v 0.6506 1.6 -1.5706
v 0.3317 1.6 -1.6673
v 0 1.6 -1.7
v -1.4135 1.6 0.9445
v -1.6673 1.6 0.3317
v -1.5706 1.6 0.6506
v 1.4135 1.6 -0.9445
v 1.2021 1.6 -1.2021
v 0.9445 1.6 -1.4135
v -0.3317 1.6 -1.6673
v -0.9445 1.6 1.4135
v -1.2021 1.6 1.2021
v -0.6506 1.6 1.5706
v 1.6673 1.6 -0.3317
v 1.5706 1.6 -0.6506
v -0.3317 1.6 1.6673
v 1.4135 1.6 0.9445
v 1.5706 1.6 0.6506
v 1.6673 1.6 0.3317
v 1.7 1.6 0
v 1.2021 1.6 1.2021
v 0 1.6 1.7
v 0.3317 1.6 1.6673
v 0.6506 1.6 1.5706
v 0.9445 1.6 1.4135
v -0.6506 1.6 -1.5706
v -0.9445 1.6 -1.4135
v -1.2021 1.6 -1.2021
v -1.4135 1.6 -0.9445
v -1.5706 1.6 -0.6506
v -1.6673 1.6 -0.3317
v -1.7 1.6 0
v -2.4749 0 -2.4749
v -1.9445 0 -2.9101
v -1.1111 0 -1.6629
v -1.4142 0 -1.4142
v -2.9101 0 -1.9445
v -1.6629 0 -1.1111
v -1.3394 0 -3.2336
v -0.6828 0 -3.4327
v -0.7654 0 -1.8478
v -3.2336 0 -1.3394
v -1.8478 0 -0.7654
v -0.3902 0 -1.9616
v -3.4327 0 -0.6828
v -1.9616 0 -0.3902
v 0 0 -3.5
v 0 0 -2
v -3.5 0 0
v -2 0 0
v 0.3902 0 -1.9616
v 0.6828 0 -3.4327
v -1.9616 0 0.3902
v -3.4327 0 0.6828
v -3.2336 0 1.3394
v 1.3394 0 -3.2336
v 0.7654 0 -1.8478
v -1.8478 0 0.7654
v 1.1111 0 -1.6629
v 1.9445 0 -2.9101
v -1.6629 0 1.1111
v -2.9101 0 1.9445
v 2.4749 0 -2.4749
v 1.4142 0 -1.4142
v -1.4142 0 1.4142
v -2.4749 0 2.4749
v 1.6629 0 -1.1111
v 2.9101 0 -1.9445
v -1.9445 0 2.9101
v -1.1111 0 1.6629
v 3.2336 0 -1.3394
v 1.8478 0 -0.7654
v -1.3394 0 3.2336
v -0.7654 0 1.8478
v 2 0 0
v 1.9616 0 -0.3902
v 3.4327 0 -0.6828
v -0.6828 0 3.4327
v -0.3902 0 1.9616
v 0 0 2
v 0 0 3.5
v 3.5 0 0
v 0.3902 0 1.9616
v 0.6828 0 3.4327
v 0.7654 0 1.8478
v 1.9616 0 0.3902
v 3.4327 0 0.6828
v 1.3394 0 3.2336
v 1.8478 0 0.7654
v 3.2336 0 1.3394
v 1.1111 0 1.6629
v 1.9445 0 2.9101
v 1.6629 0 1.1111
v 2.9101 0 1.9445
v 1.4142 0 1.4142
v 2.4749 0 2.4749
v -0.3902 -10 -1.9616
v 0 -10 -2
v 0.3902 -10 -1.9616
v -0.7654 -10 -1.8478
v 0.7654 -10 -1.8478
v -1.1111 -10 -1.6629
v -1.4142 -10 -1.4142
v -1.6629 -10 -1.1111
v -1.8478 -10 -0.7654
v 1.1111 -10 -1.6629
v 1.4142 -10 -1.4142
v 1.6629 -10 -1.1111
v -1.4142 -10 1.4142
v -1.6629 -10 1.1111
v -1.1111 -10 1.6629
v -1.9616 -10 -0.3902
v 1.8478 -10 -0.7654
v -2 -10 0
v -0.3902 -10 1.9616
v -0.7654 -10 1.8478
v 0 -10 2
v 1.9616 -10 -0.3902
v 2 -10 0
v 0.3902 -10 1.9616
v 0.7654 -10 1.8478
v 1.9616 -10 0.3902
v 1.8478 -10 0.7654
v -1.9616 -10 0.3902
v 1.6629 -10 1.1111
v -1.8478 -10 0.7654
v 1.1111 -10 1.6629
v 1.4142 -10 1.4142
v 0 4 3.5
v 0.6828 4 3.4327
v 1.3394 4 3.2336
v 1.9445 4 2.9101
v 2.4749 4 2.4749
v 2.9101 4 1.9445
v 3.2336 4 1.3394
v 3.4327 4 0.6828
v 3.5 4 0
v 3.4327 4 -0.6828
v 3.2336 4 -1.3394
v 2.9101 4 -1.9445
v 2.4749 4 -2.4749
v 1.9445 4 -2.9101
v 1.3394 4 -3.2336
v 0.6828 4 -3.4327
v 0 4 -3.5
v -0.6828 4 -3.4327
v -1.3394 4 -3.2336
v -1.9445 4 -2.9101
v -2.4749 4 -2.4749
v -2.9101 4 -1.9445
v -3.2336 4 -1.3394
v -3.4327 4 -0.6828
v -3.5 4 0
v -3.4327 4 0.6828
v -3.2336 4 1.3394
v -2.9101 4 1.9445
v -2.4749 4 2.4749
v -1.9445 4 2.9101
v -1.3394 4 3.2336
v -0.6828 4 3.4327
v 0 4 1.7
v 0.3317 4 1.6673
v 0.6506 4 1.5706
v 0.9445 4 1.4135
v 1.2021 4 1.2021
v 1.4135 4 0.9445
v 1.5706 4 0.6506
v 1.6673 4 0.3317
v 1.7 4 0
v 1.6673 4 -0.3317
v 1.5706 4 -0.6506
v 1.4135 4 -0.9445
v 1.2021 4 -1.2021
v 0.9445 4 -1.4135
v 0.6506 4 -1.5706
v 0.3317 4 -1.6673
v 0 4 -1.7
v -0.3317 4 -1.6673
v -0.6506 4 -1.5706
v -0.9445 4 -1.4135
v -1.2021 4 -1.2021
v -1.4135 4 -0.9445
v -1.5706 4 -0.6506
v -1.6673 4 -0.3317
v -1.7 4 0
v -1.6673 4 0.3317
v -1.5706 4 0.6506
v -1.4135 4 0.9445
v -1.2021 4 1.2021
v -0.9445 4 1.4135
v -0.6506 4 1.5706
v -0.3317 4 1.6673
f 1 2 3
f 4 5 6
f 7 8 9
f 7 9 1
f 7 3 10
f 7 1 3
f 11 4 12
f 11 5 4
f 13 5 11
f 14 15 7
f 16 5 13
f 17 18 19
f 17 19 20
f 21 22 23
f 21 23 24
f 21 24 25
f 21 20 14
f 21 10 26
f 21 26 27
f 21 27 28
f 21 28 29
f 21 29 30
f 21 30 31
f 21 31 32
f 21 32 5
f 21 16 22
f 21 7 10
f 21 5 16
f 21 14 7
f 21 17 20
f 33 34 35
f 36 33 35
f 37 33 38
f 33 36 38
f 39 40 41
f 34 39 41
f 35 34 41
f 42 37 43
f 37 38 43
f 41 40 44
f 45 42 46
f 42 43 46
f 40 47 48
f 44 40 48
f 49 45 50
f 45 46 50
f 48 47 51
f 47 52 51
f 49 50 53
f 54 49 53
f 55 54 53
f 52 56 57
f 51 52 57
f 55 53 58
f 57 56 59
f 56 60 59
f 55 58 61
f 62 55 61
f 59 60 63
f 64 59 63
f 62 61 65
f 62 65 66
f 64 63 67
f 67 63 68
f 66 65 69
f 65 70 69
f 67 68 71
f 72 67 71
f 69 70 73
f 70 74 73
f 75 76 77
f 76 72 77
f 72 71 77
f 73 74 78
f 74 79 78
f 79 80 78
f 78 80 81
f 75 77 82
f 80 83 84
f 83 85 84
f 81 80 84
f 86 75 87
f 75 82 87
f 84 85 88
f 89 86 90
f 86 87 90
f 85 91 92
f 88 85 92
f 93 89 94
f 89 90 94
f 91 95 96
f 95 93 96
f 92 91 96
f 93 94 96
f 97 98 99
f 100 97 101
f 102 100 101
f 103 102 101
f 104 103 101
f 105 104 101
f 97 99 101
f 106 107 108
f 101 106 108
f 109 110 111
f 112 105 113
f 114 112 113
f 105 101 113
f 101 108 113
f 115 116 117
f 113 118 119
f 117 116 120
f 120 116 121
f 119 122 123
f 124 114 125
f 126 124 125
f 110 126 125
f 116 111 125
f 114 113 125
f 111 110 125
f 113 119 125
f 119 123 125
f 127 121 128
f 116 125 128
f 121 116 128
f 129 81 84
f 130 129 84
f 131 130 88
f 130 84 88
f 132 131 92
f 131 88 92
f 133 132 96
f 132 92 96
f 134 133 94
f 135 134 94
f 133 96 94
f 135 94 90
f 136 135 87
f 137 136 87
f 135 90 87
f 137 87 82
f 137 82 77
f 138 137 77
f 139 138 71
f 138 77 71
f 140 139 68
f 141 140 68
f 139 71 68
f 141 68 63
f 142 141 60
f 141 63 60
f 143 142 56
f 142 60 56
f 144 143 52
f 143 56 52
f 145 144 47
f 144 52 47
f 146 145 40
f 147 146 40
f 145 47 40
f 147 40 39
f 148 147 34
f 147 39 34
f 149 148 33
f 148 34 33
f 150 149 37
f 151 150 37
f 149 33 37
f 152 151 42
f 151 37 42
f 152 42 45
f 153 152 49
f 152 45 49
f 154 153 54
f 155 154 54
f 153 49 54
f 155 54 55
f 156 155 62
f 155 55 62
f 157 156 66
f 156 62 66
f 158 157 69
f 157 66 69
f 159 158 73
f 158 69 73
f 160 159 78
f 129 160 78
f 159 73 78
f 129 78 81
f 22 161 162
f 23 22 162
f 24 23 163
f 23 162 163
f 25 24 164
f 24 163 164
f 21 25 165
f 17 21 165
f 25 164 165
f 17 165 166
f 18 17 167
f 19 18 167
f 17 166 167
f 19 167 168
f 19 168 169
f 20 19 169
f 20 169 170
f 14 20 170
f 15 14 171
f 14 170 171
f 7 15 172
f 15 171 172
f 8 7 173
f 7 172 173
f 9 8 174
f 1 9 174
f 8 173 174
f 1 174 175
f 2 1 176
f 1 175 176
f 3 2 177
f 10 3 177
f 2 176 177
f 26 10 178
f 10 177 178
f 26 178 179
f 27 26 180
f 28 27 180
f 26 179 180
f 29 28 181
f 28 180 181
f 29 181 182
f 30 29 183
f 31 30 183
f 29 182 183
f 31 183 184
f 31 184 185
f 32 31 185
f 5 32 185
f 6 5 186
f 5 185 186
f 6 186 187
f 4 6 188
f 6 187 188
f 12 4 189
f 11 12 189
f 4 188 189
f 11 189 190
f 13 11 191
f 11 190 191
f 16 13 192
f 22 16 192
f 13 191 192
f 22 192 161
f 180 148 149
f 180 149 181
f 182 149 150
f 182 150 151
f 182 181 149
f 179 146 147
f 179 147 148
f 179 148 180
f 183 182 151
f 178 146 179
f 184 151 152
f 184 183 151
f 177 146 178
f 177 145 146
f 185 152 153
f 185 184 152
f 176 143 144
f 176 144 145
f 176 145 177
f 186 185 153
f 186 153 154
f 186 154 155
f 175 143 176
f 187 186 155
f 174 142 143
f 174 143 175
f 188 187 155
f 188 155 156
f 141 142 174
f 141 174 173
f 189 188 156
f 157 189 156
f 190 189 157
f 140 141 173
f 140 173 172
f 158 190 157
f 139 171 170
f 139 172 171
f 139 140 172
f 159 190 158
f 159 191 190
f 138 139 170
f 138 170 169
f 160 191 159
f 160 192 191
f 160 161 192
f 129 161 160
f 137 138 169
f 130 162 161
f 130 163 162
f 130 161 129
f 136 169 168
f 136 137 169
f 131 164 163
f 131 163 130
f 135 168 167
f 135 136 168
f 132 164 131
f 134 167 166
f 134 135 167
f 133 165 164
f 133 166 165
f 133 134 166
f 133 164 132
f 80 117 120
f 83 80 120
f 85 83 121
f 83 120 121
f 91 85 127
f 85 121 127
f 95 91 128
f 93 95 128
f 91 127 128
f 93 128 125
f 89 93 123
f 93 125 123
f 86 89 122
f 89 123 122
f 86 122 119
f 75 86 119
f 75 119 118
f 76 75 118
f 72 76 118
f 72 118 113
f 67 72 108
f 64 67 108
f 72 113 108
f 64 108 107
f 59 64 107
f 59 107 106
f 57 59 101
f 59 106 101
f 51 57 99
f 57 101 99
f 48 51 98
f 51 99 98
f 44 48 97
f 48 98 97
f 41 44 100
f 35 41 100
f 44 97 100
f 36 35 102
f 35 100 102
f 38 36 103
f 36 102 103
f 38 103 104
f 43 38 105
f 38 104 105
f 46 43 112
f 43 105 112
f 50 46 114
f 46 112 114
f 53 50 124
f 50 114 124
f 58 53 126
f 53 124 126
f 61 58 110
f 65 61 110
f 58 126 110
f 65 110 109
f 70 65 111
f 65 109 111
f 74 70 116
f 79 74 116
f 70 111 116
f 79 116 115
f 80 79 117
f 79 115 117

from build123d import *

# Parameters (mm, degrees)
SKETCH1_R    = 3.5
HEAD_DEPTH   = 4
SHANK_START  = -10
SKETCH2_R    = 2
SHANK_DEPTH  = 10
SOCKET_START = 4
SKETCH3_R    = 1.7
SOCKET_DEPTH = 2.4


with BuildPart() as part:
    # Sketch1 → Head (new body)
    with BuildSketch(Plane(origin=(0, 0, 0), x_dir=(1, 0, 0), z_dir=(0, 1, 0))):
        with Locations(Location((0, 0, 0), (0, 0, 270))):
            Circle(SKETCH1_R)
    extrude(amount=HEAD_DEPTH)

    # Sketch2 → Shank (add)
    with BuildSketch(Plane(origin=(0, 0, 0), x_dir=(1, 0, 0), z_dir=(0, 1, 0)).offset(SHANK_START)):
        with Locations(Location((0, 0, 0), (0, 0, 270))):
            Circle(SKETCH2_R)
    extrude(amount=SHANK_DEPTH)

    # Sketch3 → Socket (cut)
    with BuildSketch(Plane(origin=(0, 0, 0), x_dir=(1, 0, 0), z_dir=(0, 1, 0)).offset(SOCKET_START)):
        with Locations(Location((0, 0, 0), (0, 0, 270))):
            Circle(SKETCH3_R)
    extrude(amount=-SOCKET_DEPTH, mode=Mode.SUBTRACT)


solid = part.part
